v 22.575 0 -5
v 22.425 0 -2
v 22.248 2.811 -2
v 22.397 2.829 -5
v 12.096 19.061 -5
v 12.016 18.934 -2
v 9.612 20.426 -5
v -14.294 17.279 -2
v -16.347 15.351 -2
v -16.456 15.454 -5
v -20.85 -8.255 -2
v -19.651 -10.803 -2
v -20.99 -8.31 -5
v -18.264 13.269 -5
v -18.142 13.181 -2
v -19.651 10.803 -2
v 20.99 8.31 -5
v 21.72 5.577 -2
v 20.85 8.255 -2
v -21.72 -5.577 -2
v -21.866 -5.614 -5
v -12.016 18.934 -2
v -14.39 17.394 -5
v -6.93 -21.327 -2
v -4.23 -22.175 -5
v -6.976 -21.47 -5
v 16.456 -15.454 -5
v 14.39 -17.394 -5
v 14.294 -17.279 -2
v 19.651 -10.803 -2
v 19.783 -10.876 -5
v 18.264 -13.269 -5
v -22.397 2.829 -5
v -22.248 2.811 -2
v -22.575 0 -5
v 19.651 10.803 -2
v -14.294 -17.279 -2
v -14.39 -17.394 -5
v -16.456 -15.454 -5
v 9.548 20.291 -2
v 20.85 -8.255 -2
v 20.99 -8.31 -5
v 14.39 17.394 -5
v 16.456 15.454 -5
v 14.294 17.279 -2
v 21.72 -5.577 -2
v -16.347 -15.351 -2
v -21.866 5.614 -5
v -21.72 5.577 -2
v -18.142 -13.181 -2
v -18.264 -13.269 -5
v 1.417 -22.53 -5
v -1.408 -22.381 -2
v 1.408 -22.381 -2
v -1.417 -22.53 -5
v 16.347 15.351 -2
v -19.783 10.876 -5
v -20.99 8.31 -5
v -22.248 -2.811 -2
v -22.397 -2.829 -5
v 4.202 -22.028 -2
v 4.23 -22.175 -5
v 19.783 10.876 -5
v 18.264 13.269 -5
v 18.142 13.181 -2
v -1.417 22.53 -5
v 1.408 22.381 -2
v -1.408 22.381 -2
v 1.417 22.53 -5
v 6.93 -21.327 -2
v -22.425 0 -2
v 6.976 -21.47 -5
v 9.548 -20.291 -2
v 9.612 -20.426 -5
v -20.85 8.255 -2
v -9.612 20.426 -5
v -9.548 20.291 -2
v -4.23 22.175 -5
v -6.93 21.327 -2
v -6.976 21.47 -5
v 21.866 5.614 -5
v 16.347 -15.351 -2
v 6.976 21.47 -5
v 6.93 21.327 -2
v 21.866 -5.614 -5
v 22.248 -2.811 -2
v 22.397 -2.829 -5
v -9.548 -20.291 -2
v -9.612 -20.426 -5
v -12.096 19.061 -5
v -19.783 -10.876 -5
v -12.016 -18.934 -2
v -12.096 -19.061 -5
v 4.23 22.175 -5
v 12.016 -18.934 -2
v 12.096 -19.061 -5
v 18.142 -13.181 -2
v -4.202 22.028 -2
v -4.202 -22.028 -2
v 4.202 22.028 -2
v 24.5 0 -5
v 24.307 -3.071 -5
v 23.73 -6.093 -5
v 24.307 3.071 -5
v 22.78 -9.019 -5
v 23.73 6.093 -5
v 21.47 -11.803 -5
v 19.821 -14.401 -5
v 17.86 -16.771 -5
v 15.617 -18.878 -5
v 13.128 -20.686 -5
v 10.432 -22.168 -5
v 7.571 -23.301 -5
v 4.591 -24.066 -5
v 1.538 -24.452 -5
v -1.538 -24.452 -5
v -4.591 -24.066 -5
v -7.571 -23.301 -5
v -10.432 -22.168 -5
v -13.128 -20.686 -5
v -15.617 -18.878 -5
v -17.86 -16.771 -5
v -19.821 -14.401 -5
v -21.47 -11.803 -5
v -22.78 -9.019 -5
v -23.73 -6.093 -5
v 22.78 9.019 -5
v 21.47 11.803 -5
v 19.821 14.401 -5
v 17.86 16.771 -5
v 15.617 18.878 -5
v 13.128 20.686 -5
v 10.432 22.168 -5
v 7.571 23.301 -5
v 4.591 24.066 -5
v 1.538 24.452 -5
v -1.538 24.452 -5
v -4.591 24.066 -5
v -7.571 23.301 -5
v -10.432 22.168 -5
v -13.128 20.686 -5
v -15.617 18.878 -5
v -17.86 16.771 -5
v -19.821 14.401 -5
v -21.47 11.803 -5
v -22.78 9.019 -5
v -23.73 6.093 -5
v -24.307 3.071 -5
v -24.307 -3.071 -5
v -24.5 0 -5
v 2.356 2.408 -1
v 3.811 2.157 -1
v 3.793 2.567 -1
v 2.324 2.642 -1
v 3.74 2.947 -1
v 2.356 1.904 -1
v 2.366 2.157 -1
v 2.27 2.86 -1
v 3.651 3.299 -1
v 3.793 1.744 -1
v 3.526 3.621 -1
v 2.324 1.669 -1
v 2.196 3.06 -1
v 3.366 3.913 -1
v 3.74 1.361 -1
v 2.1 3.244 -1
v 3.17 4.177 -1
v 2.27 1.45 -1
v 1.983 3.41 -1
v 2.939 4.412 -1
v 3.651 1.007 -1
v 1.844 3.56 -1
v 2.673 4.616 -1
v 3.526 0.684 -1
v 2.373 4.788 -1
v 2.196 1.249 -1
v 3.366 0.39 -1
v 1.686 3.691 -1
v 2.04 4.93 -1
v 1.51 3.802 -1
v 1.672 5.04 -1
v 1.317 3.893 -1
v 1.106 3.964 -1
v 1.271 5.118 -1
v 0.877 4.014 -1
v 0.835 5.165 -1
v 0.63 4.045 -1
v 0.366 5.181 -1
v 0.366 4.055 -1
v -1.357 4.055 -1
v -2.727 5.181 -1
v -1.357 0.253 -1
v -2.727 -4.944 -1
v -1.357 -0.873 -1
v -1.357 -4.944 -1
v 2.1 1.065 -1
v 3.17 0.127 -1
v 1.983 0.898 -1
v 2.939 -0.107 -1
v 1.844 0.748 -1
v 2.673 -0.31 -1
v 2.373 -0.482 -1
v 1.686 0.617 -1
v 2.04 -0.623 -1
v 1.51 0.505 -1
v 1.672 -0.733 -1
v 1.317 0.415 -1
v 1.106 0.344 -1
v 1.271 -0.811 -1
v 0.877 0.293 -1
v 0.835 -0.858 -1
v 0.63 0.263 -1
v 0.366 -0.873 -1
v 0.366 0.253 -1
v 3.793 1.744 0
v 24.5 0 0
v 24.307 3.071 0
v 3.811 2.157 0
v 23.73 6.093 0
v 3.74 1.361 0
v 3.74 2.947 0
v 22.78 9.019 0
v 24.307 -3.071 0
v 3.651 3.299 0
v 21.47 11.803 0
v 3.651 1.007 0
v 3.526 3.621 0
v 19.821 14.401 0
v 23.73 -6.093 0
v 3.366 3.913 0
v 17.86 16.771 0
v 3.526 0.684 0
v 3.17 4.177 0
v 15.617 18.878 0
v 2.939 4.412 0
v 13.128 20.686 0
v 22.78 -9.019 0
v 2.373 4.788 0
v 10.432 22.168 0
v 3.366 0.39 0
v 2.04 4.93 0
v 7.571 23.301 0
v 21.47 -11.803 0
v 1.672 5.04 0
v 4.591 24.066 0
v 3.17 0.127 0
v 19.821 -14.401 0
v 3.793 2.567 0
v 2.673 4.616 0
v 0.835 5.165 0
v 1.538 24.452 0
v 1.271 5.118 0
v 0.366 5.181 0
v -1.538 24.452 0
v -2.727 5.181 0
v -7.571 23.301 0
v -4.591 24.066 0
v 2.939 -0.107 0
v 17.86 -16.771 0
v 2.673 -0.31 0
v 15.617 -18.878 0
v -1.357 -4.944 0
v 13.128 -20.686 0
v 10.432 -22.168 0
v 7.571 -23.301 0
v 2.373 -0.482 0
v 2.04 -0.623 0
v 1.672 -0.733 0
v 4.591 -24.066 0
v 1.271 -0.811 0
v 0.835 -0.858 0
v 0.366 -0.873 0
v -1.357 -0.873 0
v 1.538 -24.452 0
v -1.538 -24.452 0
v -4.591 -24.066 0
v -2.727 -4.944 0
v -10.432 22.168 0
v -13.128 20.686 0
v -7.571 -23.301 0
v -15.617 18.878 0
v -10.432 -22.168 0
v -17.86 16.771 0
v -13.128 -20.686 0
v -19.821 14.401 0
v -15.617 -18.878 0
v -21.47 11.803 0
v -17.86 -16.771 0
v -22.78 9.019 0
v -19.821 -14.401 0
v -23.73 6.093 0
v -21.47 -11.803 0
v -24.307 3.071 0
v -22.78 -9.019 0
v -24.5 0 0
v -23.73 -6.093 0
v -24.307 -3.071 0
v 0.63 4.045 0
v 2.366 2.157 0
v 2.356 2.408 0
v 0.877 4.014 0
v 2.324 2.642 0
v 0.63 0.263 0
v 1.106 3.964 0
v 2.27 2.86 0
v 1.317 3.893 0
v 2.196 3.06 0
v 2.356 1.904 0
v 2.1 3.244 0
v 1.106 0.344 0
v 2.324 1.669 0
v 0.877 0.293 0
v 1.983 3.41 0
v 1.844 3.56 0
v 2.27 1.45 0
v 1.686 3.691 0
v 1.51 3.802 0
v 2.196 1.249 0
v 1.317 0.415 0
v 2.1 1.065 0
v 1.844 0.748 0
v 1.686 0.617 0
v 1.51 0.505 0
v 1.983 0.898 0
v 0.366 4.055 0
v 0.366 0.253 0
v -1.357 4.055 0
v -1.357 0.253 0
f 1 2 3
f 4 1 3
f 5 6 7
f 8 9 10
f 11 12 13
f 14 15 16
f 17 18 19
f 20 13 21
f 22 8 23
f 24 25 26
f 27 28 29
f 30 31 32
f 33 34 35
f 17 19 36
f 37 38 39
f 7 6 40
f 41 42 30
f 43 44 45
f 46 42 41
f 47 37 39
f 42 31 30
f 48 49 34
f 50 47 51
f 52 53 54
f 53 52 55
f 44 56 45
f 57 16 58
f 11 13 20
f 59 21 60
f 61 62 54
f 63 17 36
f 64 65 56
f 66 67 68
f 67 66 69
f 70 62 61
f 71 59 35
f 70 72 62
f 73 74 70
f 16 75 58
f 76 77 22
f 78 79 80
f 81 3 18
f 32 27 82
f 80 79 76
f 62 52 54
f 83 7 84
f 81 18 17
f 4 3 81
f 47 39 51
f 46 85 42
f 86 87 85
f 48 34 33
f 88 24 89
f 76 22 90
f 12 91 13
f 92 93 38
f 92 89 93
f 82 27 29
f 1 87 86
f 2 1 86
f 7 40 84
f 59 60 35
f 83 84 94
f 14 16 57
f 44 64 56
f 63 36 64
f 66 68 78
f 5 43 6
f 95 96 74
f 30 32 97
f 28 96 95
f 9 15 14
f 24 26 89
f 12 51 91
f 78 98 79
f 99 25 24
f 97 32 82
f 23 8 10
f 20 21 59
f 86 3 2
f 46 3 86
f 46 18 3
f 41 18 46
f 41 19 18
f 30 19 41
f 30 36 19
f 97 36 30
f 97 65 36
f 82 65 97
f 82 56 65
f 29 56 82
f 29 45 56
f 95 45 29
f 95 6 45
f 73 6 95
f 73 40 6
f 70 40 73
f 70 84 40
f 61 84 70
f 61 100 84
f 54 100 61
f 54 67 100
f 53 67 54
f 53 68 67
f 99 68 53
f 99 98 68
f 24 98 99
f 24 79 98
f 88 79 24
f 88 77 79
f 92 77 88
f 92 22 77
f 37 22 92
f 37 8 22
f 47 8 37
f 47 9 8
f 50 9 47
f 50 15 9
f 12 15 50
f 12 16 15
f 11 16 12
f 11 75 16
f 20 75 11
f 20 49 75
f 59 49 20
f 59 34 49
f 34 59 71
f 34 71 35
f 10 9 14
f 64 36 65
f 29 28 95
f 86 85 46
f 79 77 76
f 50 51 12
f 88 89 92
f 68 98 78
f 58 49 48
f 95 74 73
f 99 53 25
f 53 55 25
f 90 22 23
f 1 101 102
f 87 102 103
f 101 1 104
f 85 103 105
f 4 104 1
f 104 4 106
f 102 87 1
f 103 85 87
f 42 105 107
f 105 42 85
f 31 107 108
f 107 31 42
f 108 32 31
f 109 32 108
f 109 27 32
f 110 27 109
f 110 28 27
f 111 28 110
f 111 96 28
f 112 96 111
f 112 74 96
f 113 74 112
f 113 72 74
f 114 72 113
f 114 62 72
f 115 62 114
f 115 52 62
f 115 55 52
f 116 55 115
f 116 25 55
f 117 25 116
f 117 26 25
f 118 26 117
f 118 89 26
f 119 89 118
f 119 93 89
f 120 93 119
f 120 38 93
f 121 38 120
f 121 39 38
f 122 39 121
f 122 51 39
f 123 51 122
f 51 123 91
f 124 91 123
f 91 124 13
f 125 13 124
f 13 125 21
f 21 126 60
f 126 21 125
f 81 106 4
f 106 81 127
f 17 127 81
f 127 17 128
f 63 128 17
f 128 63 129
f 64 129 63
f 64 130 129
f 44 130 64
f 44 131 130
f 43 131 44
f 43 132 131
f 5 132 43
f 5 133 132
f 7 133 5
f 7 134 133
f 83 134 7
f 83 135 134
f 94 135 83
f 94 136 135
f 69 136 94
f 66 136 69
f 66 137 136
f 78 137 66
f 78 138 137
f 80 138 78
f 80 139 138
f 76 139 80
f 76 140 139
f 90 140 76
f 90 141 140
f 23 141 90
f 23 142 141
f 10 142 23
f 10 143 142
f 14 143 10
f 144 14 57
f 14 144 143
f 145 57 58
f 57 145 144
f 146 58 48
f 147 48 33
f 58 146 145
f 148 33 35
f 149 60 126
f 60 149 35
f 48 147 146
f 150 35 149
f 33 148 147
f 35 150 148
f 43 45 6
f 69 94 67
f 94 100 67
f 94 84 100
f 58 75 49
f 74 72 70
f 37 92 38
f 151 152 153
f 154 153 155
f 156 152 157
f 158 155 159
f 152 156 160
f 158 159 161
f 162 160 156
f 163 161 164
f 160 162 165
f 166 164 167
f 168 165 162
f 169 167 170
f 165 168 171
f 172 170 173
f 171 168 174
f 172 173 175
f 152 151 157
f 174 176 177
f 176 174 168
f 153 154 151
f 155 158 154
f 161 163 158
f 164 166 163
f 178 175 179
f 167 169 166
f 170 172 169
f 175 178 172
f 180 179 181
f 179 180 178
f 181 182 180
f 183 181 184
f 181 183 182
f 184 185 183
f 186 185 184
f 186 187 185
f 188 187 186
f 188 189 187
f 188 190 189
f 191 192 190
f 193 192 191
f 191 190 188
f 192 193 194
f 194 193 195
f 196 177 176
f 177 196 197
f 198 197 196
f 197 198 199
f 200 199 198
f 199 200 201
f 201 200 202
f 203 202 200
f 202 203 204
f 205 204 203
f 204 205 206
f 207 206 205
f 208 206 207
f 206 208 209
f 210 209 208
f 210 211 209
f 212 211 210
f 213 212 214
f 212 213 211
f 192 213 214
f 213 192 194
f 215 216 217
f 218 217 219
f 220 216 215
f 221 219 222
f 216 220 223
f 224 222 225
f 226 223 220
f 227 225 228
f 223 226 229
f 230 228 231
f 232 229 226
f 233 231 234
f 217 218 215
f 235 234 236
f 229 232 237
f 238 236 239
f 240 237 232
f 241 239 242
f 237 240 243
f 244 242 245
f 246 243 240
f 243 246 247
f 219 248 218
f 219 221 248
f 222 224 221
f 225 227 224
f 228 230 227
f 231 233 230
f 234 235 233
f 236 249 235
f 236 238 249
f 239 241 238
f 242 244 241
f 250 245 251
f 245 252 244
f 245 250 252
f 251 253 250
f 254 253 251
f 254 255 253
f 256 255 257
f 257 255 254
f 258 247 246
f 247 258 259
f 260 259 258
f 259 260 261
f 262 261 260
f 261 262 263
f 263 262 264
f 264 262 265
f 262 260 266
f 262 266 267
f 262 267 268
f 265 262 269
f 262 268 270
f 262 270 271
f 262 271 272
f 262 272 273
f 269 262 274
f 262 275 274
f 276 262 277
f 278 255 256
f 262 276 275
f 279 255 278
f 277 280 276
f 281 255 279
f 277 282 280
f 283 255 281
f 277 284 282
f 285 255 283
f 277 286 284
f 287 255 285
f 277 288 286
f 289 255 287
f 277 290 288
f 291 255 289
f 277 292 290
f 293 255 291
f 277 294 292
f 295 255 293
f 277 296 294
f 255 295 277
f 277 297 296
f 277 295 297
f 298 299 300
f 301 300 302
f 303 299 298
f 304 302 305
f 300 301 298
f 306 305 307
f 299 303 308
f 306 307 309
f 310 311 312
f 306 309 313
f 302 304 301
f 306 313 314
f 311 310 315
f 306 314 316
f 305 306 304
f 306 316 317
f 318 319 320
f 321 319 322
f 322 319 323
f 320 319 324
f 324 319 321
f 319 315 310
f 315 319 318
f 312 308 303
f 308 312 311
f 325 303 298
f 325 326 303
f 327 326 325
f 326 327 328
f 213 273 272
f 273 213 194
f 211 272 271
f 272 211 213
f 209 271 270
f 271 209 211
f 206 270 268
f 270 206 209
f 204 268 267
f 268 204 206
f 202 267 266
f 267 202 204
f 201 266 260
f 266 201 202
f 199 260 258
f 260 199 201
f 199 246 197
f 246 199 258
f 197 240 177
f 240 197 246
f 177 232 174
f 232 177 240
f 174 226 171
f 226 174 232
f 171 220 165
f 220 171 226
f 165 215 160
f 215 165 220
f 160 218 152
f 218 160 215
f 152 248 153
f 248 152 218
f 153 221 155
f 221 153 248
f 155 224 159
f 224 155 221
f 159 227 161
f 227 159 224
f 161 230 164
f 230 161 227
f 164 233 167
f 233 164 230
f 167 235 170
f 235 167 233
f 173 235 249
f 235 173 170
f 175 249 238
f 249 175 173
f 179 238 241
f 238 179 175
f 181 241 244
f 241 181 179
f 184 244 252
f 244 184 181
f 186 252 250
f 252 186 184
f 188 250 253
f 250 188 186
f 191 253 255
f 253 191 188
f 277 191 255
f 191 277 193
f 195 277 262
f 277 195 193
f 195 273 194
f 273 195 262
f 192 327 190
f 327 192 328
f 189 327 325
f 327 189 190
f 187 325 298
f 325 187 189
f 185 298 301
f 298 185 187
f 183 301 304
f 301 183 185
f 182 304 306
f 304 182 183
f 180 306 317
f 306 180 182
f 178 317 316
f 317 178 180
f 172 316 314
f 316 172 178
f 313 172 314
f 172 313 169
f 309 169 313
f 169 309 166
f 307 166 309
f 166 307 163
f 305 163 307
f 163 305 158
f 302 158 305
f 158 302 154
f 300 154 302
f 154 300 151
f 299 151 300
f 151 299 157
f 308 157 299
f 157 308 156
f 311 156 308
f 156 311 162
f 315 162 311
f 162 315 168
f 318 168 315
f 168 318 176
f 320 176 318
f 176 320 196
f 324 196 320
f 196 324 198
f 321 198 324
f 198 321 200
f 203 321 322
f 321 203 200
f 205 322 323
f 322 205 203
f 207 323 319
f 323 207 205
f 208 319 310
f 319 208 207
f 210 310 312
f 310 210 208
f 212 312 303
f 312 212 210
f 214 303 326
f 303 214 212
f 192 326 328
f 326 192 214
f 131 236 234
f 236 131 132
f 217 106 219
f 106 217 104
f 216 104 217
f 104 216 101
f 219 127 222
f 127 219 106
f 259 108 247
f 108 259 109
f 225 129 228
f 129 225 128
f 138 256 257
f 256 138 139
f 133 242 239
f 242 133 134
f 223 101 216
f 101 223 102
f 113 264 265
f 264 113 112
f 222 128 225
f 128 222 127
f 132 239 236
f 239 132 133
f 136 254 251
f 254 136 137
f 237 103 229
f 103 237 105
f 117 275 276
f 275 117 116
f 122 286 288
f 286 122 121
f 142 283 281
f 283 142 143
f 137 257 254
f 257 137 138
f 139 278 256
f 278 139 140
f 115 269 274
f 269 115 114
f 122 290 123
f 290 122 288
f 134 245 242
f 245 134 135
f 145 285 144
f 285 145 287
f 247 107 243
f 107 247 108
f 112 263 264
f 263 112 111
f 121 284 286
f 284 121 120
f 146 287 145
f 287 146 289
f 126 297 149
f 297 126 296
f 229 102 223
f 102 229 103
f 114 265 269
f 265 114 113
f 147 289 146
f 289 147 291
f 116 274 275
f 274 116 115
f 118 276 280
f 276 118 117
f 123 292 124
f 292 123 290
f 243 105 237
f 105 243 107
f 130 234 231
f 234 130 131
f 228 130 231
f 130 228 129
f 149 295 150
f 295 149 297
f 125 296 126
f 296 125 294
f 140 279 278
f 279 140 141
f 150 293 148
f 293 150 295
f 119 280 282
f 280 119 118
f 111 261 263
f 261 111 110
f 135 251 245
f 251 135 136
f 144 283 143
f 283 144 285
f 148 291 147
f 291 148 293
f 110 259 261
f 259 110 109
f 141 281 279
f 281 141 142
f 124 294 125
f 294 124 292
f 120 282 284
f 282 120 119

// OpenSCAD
$fn = 50;


difference() {
	union() {
		translate(v = [0, 0, -5.0000000000]) {
			cylinder(h = 5, r = 24.5000000000);
		}
	}
	union() {
		#translate(v = [0, 0, -5.0000000000]) {
			cylinder(h = 3, r1 = 22.5750000000, r2 = 22.4250000000);
		}
		translate(v = [0, 0, -1]) {
			linear_extrude(height = 1) {
				text(font = "Impact", halign = "center", size = 10, text = "P", valign = "center");
			}
		}
	}
}
